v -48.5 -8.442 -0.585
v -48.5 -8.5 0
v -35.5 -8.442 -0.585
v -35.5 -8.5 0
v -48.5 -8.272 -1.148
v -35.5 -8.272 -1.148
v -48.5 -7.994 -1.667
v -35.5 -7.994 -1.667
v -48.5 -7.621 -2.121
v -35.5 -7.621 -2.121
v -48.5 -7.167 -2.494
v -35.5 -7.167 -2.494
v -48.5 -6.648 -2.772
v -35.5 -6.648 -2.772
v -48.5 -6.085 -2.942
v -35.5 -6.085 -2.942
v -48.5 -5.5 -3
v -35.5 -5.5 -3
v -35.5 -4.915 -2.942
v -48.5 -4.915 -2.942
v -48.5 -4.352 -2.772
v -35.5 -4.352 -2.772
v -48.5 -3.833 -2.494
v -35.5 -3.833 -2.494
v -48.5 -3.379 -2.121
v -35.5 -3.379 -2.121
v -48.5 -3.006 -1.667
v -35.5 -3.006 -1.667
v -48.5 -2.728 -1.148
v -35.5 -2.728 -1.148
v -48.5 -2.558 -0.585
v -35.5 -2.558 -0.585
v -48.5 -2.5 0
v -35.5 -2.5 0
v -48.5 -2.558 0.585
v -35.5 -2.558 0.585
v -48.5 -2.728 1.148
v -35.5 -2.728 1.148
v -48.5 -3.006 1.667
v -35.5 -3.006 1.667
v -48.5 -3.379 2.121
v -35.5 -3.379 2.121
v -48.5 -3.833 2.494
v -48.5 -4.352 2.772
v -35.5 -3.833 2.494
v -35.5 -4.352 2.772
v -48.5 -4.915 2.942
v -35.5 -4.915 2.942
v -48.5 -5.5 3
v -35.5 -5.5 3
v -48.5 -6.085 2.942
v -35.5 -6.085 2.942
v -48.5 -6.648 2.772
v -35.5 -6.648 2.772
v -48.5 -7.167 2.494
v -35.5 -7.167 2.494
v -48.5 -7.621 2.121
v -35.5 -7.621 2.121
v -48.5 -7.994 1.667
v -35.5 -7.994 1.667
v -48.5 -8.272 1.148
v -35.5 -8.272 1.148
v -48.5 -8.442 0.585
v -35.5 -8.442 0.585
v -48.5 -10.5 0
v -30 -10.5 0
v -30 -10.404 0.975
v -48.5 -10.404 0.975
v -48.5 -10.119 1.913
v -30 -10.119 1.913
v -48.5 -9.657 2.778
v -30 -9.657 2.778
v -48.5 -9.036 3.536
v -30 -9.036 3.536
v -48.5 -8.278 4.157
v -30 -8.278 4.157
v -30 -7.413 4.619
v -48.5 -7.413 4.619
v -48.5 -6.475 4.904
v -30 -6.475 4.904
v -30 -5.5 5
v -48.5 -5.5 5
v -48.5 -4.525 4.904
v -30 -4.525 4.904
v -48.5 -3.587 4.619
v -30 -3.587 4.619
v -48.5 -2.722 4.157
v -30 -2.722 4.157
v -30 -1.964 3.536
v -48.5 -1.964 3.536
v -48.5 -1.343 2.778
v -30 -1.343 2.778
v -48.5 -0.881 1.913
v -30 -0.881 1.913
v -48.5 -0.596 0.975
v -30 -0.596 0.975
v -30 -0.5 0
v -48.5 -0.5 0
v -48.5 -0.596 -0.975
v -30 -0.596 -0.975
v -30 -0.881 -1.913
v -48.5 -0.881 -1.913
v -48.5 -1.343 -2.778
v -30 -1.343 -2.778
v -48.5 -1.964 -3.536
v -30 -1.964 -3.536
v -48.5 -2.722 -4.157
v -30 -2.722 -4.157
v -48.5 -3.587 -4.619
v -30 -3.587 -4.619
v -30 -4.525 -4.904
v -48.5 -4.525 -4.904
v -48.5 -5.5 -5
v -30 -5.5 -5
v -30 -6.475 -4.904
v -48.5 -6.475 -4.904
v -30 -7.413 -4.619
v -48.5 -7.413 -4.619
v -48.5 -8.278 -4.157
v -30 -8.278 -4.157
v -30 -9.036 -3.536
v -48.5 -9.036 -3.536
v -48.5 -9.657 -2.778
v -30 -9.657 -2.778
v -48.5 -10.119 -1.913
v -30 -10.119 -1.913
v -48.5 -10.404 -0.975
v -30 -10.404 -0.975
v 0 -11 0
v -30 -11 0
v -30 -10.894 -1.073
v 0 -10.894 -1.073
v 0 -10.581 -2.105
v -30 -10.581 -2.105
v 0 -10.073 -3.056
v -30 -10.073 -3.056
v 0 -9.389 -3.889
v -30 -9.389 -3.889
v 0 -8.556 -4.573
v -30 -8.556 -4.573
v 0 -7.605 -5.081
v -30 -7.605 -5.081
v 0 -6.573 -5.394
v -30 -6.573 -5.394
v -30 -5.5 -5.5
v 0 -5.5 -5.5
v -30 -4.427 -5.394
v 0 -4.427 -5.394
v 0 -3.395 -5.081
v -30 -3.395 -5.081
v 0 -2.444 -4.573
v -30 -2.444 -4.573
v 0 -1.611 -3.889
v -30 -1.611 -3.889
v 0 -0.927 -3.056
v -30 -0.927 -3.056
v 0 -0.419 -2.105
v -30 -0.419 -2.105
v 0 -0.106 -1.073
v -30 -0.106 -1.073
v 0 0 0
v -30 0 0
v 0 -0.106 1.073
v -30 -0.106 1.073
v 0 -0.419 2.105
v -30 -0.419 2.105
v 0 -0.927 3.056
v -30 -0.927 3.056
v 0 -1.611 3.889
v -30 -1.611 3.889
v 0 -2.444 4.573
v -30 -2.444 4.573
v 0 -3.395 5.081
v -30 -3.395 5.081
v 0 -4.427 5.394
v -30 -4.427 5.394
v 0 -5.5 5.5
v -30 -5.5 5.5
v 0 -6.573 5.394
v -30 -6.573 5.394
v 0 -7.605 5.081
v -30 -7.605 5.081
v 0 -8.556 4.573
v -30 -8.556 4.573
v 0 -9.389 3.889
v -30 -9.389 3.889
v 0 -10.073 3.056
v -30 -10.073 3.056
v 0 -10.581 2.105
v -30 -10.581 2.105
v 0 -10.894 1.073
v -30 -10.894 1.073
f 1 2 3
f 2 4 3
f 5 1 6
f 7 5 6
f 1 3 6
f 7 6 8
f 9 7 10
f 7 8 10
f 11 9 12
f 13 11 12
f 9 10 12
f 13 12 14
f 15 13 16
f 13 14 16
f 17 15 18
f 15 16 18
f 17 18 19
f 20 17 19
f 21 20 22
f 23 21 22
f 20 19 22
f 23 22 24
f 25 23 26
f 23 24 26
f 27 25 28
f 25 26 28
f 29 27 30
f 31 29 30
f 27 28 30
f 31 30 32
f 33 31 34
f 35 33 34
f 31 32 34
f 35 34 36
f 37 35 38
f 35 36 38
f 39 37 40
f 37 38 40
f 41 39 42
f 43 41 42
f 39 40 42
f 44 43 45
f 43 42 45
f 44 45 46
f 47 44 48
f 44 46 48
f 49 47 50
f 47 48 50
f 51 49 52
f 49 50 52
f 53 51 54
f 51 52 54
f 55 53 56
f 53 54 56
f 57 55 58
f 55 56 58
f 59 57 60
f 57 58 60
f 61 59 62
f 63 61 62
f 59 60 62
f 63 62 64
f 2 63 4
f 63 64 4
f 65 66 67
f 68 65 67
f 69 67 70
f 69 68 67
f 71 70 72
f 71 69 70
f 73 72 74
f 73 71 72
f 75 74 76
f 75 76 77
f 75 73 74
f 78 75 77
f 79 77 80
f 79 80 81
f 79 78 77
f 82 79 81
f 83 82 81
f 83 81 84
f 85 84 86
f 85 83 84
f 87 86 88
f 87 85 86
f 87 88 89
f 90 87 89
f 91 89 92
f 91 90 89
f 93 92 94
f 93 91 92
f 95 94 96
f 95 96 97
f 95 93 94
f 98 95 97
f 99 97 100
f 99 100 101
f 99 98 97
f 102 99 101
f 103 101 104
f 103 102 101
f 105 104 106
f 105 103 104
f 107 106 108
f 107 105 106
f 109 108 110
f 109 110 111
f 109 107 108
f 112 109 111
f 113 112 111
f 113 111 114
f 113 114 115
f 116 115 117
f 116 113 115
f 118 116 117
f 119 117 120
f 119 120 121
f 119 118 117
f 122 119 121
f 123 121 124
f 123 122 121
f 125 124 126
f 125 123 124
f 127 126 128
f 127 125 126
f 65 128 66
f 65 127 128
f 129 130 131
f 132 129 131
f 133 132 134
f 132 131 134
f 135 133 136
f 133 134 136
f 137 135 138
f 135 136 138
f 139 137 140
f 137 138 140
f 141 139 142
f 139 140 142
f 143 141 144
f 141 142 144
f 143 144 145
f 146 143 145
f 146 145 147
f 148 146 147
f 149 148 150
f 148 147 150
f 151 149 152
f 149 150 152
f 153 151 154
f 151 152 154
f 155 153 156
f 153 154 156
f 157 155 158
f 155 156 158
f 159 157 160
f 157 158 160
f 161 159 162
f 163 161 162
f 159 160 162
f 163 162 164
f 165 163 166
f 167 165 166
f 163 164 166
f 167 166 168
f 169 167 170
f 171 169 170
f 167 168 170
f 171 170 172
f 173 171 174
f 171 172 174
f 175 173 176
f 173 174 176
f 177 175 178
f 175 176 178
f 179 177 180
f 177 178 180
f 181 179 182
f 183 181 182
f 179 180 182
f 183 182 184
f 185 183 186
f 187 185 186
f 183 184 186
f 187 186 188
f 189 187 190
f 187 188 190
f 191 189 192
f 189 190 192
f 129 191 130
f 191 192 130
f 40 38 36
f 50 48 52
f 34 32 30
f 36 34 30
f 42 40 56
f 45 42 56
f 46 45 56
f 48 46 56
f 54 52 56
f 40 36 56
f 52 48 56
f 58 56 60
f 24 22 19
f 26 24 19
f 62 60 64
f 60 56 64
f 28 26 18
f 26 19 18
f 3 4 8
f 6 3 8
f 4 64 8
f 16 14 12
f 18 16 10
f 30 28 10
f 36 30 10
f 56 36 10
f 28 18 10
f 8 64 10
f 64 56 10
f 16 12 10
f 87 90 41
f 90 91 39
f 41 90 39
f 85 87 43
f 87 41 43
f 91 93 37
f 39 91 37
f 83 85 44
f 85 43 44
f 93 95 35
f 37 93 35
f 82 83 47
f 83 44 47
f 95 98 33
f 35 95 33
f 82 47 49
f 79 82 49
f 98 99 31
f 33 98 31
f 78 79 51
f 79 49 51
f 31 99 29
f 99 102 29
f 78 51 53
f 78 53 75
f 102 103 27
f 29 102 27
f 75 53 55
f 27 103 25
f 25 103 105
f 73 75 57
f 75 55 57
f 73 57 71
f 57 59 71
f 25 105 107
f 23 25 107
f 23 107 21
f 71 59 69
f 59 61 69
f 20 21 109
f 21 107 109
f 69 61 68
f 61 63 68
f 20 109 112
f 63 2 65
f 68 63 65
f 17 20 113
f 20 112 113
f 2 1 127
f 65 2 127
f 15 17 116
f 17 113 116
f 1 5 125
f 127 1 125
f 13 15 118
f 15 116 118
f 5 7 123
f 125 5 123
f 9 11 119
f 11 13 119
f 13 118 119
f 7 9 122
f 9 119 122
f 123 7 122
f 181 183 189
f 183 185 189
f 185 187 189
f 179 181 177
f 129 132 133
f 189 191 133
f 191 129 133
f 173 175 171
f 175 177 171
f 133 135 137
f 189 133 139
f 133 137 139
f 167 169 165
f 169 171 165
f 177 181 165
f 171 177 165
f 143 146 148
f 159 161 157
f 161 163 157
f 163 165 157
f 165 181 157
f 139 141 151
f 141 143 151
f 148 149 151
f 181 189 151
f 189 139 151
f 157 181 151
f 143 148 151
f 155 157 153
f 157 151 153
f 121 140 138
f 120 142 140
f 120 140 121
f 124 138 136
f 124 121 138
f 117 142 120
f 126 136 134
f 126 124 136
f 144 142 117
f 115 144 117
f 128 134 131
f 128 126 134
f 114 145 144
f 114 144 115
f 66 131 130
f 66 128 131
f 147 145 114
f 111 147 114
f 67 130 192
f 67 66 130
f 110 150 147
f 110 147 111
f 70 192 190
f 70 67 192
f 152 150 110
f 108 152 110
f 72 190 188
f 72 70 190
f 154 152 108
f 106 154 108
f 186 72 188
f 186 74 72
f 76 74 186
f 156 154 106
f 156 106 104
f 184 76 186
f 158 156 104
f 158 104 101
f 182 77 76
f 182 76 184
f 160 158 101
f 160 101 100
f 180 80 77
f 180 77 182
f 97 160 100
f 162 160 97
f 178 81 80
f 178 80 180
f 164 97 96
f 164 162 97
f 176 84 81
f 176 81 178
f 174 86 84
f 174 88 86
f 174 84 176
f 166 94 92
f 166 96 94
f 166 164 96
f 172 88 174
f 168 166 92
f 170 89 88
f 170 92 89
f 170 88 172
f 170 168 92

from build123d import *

# Parameters (mm, degrees)
ESQUISSE2_OUTSIDE_W = 23.186
ESQUISSE2_OUTSIDE_H = 23.186
ESQUISSE2_OUTSIDE_R = 5
EXTRUSION1_DEPTH    = 18.5


with BuildPart() as part:
    # Esquisse1 → Révolution1 (revolve)
    with BuildSketch(Plane.XY, mode=Mode.PRIVATE) as r_volution1_sk:
        Polygon((0, 0), (-48.5, 0), (-48.5, -2.5), (-35.5, -2.5), (-35.5, -5.5), (0, -5.5), align=None)
    revolve(r_volution1_sk.sketch.rotate(Axis((-35.5, -5.5, 0), (1, 0, 0)), 180), axis=Axis((-35.5, -5.5, 0), (1, 0, 0)))

    # Esquisse2 outside → Extrusion1 (cut)
    with BuildSketch(Plane.ZY.offset(48.5)):
        with Locations((0, -5.5)):
            Rectangle(ESQUISSE2_OUTSIDE_W, ESQUISSE2_OUTSIDE_H)
        with Locations(Location((0, -5.5, 0), (0, 0, 270))):
            Circle(ESQUISSE2_OUTSIDE_R, mode=Mode.SUBTRACT)
    extrude(amount=-EXTRUSION1_DEPTH, mode=Mode.SUBTRACT)


solid = part.part
